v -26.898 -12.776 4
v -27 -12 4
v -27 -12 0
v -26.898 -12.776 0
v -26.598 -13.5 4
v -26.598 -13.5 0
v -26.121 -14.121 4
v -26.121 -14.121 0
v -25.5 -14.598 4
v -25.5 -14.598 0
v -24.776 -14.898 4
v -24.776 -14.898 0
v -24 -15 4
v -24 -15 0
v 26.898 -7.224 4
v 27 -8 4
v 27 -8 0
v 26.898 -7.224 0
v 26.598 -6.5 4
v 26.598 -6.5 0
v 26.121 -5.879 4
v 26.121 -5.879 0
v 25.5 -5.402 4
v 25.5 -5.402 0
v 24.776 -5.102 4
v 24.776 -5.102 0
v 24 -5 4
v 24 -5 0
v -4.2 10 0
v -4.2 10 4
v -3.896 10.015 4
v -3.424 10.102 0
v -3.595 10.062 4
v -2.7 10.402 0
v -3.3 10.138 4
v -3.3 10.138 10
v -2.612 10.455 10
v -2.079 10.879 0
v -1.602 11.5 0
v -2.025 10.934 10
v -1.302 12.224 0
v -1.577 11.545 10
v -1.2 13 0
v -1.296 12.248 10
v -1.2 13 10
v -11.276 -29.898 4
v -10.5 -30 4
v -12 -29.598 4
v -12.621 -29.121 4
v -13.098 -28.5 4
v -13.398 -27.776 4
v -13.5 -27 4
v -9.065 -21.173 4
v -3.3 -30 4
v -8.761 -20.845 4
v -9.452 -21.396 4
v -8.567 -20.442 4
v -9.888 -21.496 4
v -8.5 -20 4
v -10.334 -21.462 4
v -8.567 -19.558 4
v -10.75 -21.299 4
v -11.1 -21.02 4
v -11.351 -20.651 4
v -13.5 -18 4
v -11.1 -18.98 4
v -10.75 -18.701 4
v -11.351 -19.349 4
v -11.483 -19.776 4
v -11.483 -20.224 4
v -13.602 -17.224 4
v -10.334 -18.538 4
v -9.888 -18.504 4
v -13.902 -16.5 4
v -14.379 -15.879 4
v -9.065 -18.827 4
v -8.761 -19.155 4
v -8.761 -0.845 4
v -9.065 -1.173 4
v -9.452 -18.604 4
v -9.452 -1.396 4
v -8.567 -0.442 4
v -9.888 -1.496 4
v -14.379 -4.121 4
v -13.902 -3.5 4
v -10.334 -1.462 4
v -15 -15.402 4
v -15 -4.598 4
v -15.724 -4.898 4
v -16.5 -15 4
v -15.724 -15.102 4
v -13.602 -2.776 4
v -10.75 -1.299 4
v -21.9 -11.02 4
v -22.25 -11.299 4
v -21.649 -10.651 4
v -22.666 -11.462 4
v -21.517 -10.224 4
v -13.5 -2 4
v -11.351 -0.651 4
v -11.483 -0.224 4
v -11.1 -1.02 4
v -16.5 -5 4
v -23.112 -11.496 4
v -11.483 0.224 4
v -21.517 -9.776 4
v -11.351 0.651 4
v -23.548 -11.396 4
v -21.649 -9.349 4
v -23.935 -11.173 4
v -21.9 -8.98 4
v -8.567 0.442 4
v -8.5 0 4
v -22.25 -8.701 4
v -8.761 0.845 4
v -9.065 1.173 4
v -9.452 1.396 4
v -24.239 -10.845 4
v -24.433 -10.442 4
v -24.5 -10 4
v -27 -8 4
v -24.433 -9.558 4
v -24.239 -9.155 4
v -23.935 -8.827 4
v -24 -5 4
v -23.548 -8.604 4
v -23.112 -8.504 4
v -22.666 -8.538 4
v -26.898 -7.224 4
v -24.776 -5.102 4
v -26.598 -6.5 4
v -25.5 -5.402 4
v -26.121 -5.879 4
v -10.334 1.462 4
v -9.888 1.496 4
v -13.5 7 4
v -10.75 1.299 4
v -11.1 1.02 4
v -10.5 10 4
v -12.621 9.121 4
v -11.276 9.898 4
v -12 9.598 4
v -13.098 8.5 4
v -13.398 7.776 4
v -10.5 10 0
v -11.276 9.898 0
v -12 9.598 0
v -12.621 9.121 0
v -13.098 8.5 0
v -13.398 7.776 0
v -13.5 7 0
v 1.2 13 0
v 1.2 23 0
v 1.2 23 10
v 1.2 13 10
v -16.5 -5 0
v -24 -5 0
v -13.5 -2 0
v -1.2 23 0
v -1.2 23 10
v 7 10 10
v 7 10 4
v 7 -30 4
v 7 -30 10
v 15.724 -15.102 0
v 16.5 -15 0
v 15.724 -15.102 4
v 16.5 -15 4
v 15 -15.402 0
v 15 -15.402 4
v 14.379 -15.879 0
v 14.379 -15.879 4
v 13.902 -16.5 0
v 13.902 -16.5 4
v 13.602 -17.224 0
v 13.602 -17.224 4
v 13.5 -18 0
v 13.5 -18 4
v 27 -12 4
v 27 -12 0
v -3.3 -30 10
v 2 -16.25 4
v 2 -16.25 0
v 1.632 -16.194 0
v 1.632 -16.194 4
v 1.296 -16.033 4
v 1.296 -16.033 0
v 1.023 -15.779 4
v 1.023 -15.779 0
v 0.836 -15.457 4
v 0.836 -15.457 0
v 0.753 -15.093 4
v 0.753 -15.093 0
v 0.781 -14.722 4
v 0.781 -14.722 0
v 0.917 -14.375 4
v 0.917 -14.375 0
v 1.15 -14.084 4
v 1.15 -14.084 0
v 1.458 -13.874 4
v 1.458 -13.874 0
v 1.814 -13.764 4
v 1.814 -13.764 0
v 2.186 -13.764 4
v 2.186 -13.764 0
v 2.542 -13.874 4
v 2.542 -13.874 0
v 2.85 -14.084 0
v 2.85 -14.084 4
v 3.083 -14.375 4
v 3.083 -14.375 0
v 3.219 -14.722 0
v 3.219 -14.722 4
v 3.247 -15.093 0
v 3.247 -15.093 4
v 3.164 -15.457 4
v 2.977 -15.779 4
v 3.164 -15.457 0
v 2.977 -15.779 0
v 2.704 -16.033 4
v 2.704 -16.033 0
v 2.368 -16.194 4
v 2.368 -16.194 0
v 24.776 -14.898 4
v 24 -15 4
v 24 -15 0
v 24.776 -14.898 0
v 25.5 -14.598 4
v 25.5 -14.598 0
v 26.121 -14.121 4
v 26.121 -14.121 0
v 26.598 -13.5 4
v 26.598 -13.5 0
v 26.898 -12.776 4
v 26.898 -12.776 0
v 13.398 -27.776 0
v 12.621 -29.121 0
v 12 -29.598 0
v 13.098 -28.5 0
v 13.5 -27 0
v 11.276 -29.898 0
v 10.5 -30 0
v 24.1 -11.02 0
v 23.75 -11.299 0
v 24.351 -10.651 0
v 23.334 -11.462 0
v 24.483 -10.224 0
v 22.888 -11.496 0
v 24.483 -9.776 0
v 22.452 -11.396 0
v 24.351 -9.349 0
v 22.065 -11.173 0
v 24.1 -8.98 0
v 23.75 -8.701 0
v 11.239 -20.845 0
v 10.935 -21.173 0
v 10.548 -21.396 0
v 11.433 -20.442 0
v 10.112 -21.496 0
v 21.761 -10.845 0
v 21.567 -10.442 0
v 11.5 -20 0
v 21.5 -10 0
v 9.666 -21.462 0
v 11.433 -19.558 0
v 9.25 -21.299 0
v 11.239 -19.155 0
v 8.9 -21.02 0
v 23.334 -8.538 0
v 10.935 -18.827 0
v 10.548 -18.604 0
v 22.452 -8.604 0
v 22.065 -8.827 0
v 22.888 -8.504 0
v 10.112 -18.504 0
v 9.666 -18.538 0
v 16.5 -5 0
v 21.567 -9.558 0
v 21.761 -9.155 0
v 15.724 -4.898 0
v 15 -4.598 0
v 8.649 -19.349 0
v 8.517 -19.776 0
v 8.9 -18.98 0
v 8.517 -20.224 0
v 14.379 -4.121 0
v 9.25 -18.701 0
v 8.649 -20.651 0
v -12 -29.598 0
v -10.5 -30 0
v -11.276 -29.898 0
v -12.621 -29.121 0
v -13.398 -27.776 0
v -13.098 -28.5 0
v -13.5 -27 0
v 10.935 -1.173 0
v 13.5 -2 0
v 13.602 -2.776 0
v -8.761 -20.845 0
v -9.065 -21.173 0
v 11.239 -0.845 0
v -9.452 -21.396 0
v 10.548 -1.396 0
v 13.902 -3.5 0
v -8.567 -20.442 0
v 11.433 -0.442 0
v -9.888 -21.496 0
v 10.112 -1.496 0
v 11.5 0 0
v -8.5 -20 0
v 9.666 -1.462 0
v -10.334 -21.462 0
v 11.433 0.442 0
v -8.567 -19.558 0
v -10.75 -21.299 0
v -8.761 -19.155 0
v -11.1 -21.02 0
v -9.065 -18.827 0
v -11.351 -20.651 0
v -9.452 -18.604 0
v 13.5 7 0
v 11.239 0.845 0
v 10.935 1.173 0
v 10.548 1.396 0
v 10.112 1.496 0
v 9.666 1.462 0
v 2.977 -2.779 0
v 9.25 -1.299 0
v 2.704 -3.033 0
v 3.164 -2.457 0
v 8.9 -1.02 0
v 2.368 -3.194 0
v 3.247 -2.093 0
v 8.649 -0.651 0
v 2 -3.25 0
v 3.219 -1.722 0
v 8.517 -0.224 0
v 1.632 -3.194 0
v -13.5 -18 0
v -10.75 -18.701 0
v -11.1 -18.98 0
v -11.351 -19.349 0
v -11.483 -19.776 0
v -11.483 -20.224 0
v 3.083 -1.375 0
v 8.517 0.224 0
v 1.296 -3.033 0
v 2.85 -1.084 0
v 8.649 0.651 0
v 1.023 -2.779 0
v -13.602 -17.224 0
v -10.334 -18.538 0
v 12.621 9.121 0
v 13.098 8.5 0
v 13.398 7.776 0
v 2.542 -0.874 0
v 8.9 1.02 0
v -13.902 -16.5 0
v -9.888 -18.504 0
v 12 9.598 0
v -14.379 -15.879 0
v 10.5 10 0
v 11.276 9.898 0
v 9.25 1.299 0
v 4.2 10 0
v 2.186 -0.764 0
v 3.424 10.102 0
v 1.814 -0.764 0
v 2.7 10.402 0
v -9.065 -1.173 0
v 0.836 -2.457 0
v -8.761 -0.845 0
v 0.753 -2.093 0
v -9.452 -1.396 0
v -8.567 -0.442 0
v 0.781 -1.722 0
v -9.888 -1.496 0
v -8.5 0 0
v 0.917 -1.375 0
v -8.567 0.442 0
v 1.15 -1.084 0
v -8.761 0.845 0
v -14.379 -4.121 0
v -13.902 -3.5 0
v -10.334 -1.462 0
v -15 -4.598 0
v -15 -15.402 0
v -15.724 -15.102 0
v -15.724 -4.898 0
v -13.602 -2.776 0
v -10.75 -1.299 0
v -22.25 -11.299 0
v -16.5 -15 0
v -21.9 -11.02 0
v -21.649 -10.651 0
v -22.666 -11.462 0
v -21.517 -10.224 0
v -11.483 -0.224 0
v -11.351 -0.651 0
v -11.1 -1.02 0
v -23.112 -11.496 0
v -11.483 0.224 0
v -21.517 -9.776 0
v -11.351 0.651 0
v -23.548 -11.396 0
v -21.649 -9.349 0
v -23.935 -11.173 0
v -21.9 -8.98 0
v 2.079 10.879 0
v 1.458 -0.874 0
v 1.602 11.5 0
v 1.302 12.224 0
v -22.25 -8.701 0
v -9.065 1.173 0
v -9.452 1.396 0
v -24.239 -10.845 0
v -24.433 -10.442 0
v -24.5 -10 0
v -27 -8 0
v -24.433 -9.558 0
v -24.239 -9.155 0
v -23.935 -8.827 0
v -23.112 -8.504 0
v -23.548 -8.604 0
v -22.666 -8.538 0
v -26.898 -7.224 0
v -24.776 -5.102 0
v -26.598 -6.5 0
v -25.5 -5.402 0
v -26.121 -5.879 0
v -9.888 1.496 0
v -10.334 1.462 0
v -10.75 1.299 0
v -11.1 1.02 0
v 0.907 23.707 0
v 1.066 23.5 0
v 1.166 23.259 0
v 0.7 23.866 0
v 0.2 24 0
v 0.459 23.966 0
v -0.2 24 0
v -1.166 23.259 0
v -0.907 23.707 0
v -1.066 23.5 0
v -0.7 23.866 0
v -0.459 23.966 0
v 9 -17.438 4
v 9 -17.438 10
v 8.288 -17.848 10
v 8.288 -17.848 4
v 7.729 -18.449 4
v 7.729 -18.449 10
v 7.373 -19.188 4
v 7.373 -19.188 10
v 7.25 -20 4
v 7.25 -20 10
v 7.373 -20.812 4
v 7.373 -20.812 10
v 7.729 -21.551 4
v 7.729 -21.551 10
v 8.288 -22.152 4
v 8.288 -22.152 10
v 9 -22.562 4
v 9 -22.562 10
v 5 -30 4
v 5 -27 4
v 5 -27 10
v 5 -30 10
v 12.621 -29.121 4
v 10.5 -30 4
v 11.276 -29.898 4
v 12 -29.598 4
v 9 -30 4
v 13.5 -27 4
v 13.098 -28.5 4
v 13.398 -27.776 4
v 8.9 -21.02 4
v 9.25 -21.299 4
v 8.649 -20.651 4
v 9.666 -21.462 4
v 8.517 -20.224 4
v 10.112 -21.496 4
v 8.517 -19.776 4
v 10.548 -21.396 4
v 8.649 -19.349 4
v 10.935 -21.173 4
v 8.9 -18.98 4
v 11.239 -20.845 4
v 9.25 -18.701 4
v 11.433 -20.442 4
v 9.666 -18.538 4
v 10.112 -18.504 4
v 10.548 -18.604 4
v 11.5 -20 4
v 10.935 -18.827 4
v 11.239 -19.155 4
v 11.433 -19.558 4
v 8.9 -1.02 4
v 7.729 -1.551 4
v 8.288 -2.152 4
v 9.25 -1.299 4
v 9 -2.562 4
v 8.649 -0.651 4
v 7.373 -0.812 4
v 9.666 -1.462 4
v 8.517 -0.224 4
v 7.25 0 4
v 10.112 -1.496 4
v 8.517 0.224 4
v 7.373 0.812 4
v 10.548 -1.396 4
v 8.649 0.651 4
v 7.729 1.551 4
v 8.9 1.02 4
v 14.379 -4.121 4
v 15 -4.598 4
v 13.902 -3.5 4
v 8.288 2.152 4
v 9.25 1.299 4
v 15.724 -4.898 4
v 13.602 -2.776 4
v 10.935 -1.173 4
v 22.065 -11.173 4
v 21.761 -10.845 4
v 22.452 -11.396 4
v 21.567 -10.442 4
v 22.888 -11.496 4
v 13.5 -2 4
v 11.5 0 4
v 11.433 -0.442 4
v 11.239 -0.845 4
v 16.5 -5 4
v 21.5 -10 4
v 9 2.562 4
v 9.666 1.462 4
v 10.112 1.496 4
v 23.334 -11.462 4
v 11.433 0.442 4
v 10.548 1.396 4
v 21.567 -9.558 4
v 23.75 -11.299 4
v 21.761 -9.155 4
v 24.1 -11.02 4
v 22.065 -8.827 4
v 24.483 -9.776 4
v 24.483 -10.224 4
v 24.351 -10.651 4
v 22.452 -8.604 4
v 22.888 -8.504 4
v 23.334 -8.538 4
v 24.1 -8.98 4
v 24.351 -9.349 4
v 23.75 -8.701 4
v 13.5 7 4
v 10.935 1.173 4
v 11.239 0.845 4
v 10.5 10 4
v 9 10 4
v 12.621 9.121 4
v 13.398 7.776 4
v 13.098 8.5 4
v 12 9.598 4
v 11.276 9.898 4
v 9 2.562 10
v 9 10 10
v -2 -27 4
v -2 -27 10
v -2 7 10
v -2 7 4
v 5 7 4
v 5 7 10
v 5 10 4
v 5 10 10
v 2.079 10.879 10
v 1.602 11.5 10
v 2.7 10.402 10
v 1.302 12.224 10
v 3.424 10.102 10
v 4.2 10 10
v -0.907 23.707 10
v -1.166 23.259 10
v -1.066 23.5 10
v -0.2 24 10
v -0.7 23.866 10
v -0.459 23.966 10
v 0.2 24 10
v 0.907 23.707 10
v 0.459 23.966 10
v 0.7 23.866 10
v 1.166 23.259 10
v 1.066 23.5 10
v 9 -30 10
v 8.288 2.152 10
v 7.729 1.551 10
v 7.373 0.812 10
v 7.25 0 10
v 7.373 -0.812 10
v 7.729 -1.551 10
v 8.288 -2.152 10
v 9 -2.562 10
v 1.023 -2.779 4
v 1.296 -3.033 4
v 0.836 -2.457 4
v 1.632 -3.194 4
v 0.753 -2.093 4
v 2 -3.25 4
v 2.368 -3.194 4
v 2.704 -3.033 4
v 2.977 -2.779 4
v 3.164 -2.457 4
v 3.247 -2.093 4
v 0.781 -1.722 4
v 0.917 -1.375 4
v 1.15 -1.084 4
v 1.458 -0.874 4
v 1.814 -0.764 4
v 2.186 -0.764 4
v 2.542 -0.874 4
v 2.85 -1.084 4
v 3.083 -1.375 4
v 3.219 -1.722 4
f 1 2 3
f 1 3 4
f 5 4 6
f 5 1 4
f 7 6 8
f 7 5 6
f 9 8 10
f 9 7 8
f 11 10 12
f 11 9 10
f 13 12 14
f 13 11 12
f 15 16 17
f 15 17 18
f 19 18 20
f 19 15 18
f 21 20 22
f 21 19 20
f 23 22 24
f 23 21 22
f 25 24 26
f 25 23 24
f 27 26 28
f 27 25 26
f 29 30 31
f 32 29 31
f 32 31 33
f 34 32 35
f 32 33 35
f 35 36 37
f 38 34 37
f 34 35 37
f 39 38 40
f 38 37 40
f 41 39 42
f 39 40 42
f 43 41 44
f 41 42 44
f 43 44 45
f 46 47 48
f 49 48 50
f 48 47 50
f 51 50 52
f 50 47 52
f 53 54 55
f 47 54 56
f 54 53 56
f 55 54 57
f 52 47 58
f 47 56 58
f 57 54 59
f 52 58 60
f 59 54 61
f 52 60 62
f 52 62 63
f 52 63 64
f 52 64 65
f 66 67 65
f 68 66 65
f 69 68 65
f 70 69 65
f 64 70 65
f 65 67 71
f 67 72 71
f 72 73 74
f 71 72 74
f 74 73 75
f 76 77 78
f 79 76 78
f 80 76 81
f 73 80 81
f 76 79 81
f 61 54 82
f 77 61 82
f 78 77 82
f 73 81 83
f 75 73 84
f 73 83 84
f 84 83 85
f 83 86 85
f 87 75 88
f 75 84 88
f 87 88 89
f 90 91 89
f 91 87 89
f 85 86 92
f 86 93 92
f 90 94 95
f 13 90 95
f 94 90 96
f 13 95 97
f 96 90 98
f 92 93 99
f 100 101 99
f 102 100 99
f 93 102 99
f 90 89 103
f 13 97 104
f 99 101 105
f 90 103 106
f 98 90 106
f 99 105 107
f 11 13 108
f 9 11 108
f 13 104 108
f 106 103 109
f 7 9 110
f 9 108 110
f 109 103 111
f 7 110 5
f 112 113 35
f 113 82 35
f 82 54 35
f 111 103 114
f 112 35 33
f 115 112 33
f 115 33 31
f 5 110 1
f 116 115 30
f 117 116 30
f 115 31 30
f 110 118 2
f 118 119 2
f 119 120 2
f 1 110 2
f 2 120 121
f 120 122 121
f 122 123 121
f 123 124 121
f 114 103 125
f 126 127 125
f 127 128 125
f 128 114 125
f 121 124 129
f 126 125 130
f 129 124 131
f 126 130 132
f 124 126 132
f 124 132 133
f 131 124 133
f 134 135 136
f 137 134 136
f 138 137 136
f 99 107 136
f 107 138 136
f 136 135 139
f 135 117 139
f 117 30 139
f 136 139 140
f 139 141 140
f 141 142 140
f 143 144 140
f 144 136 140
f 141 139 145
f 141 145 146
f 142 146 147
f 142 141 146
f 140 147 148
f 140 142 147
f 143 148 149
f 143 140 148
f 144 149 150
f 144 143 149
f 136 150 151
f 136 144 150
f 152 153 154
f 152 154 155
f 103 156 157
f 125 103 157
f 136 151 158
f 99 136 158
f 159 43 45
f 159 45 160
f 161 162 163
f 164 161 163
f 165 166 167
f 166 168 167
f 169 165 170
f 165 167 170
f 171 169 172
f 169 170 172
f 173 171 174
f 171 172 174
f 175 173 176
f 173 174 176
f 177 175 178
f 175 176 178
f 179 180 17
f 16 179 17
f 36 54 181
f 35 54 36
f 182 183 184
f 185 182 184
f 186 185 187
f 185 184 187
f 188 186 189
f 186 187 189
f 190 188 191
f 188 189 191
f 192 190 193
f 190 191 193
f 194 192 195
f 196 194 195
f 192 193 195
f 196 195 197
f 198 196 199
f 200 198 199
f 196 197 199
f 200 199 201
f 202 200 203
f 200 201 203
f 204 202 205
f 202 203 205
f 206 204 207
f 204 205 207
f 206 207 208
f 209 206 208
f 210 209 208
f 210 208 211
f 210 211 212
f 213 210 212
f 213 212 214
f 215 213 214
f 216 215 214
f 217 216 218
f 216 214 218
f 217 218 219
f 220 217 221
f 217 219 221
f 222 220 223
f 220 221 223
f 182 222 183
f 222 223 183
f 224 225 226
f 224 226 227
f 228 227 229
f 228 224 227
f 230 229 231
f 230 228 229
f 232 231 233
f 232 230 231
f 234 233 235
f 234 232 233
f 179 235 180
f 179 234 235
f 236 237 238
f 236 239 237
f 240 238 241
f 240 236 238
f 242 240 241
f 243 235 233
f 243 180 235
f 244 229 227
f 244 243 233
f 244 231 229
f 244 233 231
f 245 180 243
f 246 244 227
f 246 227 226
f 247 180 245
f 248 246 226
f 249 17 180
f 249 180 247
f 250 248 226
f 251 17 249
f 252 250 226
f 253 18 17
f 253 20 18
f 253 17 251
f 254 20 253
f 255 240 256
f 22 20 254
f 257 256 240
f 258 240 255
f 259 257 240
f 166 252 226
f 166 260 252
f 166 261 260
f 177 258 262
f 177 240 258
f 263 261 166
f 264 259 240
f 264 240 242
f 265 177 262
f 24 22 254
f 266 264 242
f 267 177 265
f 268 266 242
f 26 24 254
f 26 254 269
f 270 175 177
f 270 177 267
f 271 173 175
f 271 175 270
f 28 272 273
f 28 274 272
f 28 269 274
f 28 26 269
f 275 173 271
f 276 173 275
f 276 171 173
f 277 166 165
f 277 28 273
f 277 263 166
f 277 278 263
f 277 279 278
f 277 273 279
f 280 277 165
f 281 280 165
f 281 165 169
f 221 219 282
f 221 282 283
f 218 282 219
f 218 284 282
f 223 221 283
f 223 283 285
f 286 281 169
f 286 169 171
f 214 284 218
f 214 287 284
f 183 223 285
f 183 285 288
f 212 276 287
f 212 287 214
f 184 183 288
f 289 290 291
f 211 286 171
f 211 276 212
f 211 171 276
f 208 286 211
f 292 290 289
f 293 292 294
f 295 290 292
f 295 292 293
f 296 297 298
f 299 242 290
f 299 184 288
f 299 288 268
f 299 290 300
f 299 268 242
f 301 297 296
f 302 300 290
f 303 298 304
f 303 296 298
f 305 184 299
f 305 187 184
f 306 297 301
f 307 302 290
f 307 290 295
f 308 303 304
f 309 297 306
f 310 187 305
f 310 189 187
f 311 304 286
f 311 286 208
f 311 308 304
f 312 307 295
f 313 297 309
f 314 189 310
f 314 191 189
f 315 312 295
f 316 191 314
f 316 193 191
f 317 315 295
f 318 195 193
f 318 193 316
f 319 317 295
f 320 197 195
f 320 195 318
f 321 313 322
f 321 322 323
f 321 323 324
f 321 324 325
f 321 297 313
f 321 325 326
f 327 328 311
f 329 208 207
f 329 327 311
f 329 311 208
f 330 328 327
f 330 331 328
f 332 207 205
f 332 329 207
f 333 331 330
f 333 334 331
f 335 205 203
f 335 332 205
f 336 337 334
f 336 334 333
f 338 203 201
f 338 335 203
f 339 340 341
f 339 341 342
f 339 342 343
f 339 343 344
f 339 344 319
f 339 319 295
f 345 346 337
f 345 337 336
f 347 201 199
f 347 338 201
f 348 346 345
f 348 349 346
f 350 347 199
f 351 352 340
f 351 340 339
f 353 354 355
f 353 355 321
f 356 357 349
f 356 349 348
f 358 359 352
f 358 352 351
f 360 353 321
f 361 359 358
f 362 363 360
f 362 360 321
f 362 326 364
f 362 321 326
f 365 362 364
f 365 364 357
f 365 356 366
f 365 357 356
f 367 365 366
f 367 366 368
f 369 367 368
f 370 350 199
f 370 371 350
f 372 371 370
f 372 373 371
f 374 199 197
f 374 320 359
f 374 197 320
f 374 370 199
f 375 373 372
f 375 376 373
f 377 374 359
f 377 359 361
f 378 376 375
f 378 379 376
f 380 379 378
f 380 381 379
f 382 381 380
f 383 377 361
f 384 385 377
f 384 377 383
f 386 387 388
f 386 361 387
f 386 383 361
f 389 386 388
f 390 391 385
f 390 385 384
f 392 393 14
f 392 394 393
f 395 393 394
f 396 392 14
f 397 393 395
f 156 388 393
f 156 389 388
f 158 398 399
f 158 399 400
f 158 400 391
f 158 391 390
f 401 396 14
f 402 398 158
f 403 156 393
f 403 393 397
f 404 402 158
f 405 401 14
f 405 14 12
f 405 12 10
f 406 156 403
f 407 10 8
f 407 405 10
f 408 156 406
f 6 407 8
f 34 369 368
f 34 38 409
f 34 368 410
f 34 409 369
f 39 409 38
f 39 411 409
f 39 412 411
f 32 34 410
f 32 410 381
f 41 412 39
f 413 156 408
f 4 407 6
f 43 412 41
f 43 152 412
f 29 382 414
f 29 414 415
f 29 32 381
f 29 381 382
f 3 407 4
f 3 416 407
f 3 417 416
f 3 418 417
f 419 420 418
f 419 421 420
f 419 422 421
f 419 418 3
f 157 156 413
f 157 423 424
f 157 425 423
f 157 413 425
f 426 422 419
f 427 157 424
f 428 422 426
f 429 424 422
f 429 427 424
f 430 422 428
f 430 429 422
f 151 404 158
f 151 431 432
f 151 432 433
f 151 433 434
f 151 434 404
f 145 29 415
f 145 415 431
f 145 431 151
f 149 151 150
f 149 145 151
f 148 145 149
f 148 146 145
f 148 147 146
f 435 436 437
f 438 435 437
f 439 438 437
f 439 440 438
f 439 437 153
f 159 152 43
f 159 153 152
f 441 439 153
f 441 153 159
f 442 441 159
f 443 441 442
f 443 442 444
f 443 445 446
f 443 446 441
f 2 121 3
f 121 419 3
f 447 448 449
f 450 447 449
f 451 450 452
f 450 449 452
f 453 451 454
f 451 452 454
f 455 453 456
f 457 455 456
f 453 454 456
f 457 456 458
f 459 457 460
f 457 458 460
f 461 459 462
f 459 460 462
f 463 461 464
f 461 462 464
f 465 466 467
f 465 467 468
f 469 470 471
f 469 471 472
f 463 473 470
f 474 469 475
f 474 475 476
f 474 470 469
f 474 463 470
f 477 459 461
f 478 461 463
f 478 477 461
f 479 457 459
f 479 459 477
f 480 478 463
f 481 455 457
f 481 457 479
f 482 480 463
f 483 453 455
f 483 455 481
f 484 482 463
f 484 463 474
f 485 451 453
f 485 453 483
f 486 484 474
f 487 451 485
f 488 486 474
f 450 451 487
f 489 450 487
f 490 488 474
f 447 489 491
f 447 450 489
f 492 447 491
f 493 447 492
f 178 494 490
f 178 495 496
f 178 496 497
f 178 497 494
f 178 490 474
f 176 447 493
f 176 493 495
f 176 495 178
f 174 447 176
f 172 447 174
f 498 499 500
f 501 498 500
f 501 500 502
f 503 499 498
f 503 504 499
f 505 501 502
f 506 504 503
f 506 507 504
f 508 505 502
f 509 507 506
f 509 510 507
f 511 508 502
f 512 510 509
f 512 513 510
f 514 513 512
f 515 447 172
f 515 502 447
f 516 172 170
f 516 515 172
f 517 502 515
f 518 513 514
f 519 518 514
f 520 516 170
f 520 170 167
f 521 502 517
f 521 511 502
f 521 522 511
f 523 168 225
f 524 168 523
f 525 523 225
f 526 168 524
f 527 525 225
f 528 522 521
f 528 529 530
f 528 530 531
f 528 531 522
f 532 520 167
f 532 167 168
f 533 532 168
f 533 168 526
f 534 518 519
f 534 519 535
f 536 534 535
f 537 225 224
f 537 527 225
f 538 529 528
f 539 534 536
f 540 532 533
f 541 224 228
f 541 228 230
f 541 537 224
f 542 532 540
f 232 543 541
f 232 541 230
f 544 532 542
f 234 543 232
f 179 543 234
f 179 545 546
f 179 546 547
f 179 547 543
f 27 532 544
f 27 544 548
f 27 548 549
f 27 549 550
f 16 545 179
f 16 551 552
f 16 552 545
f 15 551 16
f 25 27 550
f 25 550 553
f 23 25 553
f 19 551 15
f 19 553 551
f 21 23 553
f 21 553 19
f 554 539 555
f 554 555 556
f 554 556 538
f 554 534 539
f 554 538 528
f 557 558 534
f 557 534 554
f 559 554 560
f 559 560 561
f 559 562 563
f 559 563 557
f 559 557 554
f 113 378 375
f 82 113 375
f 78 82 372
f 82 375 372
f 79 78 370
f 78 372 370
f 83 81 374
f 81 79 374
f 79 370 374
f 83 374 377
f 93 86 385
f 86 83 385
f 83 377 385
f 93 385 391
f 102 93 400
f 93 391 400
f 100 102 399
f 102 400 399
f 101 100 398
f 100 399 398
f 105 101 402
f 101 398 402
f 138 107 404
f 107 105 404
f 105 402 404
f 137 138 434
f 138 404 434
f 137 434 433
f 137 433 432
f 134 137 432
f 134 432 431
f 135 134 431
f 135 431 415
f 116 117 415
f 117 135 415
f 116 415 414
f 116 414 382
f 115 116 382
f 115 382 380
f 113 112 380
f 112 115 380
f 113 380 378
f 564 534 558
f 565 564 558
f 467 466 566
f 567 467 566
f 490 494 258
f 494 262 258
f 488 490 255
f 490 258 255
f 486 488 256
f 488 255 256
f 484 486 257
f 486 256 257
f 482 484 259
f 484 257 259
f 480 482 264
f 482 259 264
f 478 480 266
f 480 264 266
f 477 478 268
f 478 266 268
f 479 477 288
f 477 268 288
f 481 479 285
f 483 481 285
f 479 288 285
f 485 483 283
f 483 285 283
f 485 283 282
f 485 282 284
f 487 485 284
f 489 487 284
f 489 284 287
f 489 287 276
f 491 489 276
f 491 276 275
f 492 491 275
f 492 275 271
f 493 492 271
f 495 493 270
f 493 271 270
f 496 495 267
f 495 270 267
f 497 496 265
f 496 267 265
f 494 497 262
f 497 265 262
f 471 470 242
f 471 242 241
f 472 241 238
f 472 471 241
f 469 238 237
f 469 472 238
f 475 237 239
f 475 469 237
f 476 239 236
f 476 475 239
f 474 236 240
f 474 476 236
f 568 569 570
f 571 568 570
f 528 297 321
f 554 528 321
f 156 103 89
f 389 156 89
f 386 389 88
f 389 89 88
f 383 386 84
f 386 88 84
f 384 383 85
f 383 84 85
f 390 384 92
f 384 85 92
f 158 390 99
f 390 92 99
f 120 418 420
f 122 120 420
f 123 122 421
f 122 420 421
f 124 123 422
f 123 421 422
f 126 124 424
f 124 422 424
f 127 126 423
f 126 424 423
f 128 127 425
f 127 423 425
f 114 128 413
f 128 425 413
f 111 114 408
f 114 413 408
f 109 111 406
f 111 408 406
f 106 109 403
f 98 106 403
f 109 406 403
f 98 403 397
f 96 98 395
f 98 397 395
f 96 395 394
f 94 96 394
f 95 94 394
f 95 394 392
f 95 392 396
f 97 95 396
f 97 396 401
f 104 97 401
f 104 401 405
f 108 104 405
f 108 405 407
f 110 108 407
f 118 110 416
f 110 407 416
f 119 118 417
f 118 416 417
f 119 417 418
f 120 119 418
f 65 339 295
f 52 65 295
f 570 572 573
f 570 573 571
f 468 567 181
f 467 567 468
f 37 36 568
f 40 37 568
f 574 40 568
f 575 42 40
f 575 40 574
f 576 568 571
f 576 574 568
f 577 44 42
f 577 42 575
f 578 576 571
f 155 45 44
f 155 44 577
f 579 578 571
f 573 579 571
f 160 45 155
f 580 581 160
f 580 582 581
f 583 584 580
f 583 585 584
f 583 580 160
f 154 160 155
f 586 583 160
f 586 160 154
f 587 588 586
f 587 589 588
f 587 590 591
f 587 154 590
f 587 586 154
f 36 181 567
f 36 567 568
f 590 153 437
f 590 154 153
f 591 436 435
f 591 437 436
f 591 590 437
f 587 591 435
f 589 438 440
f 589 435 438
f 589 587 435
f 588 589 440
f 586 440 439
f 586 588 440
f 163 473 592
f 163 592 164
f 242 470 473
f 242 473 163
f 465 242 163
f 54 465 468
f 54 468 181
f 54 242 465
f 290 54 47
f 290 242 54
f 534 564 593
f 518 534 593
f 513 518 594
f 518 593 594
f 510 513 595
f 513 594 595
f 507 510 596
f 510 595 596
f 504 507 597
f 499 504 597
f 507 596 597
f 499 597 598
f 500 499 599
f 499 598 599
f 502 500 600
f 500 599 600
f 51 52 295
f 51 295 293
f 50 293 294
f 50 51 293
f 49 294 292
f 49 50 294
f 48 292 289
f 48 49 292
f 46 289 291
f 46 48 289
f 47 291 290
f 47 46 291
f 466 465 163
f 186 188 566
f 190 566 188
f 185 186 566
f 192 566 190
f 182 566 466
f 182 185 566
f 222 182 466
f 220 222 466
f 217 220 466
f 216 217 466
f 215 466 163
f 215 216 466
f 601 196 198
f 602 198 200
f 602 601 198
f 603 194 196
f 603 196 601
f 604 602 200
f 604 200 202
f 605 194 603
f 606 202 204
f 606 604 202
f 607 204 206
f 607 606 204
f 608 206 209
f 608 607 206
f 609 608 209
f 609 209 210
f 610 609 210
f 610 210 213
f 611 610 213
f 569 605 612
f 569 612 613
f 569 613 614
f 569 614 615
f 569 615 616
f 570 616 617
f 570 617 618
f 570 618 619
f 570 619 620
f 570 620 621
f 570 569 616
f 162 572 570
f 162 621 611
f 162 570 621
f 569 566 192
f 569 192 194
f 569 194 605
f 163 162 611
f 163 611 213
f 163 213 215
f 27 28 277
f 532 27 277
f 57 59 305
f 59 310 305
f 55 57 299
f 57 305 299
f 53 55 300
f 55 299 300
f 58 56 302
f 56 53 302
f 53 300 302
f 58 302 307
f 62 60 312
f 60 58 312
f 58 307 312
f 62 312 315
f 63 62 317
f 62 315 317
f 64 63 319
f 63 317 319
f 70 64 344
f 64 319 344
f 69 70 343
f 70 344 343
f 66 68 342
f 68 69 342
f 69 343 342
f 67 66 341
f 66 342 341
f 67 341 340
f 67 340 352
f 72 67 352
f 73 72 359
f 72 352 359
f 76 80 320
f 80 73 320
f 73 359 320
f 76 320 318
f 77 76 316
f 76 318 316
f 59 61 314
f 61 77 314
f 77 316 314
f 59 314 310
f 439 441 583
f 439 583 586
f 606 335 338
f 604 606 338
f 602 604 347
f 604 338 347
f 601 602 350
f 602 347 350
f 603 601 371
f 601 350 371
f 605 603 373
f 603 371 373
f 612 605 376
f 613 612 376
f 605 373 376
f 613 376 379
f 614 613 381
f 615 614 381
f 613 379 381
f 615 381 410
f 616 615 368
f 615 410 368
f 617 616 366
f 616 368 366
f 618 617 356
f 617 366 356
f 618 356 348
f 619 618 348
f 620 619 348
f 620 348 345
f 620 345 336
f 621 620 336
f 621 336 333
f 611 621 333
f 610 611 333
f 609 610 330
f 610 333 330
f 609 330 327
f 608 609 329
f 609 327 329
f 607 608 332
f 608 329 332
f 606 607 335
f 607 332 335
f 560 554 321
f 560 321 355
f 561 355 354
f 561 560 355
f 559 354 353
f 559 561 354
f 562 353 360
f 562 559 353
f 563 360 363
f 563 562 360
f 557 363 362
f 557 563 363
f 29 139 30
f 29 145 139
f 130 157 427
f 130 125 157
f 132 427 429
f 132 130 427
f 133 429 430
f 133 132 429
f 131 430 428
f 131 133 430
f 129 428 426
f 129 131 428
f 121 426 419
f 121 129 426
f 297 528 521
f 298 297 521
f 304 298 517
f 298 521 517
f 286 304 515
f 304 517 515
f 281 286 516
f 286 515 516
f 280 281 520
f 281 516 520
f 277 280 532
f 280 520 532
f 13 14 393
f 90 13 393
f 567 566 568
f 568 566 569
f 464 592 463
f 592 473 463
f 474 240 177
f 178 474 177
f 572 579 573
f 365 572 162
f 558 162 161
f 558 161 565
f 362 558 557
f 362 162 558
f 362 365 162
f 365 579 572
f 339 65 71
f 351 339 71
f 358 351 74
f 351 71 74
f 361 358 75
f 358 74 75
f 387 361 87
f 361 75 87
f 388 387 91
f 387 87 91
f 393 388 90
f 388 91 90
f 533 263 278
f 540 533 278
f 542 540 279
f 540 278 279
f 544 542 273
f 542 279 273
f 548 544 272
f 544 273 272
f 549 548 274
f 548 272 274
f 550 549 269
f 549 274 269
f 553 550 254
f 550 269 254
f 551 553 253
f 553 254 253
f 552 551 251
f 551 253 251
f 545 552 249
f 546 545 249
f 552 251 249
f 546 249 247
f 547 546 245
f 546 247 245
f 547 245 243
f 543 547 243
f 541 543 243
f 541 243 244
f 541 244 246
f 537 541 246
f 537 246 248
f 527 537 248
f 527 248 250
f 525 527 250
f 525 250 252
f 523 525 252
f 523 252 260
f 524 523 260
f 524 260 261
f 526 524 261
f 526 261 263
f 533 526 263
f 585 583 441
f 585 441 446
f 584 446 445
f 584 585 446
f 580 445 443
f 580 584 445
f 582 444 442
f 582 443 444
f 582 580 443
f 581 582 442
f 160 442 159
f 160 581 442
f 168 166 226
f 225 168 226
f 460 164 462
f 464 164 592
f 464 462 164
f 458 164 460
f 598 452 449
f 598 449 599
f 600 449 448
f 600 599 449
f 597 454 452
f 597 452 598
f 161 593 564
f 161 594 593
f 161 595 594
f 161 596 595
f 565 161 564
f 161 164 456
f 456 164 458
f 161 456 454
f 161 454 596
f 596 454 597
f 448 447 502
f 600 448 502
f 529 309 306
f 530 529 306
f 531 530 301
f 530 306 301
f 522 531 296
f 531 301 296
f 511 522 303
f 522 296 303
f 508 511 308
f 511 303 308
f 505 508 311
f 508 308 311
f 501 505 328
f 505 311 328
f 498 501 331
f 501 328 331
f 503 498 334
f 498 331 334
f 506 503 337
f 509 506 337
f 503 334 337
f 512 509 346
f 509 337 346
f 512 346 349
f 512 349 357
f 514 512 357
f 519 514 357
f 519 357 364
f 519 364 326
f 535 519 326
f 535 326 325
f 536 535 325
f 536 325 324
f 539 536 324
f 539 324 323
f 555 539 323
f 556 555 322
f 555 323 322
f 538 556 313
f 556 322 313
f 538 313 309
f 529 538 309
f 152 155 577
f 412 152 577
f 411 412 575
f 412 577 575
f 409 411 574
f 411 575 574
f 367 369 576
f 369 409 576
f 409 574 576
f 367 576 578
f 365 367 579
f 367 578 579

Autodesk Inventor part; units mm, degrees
ref_plane "YZ Plane" through (0, 0, 0) normal (1, 0, 0) x (0, 1, 0)
ref_plane "XZ Plane" through (0, 0, 0) normal (0, 1, 0) x (-1, 0, 0)
ref_plane "XY Plane" through (0, 0, 0) normal (0, 0, 1) x (1, 0, 0)
sketch "Sketch1" plane through (0, 0, 0) normal (0, 0, 1) x (1, 0, 0)
  circle A0 centre (-10, 0) radius 1.5
  circle A1 centre (10, 0) radius 1.5
  circle A2 centre (-10, -20) radius 1.5
  circle A3 centre (10, -20) radius 1.5
  line L0 (-15, 10) -> (15, 10)
  line L1 (15, 10) -> (15, -30)
  line L2 (15, -30) -> (-15, -30)
  line L3 (-15, -30) -> (-15, 10)
  point P0 (0, 0)
  dimension "d0" = 3
  dimension "d1" = 3
  dimension "d2" = 20
  dimension "d3" = 10
  dimension "d4" = 3
  dimension "d5" = 3
  dimension "d6" = 20
  dimension "d7" = 20
  dimension "d8" = 20
  dimension "d9" = 10
  dimension "d10" = 30
  dimension "d11" = 15
  dimension "d12" = 40
  dimension "d13" = 10
extrude "Extrusion1" add sketch "Sketch1" along normal blind 4
sketch "Sketch2" plane through (0, 0, 4) normal (0, 0, 1) x (1, 0, 0)
  line L0 (0, 15.4421) -> (0, -37.5419) construction
  line L1 (-4, 15.4421) -> (-4, -37.5419) construction
  line L2 (-15, -30) -> (15, -30) construction
  line L3 (15, 10) -> (-15, 10) projected
  line L4 (9, -30) -> (9, 10)
  line L5 (7, 10) -> (7, -30)
  line L6 (7, 10) -> (9, 10)
  line L7 (7, -30) -> (9, -30)
  line L8 (6.3, 15.4421) -> (6.3, 10) construction
  line L9 (6.3, -30) -> (6.3, -37.5419) construction
  line L10 (-15, 10) -> (-15, -30) projected
  point P0 (0, 0)
  dimension "d16" = 4
  dimension "d96" = 0
  dimension "d97" = 0
  dimension "d141" = 22
extrude "Extrusion2" add sketch "Sketch2" along normal blind 6
sketch "Sketch4" plane through (0, 0, 10) normal (0, 0, 1) x (1, 0, 0)
  circle A0 centre (10, 0) radius 2.75
  circle A1 centre (10, -20) radius 1.5 projected
  circle A2 centre (10, -20) radius 2.75
  point P0 (0, 0)
  point P1 (8.5, 0)
  point P2 (8.5, -20)
  dimension "d37" = 5.5
  dimension "d38" = 5.5
extrude "Extrusion3" cut sketch "Sketch4" against normal up to surface (6 mm away) contours A0 | A1 | A2
sketch "Sketch5" plane through (0, 0, 4) normal (0, 0, 1) x (1, 0, 0)
  line L0 (-4, 15.4421) -> (-4, -37.5419) construction
  line L1 (15, -30) -> (-15, -30) projected
  line L2 (15, 10) -> (-15, 10) projected
  line L3 (-3.3, 10) -> (5, 10)
  line L4 (5, -30) -> (-3.3, -30)
  line L5 (-3.3, -30) -> (-3.3, 10)
  line L6 (-2, 7) -> (5, 7)
  line L7 (5, -27) -> (-2, -27)
  line L8 (-2, -27) -> (-2, 7)
  line L9 (5, 10) -> (5, 7)
  line L10 (5, -27) -> (5, -30)
  line L11 (7, 10) -> (7, -30) projected
  point P0 (0, 0)
  point P1 (6.3, 10)
  point P2 (6.3, -30)
  dimension "d111" = 0.7
  dimension "d112" = 3
  dimension "d115" = 3
  dimension "d116" = 1.3
  dimension "d117" = 2
  dimension "d118" = 2
  dimension "d139" = 0
  dimension "d140" = 0
extrude "Extrusion4" add sketch "Sketch5" along normal up to surface (6 mm away) contours L1 L5 L2 L9 L6 L8 L7 L10
sketch "Sketch8" plane through (0, 0, 0) normal (0, 0, -1) x (-1, 0, 0)
  line L0 (27, -15) -> (-27, -15)
  line L1 (-27, -15) -> (-27, -5)
  line L2 (-27, -5) -> (27, -5)
  line L3 (27, -5) -> (27, -15)
  line L4 (15, 10) -> (-15, 10) projected
  line L5 (-15, -30) -> (15, -30) projected
  circle A0 centre (23, -10) radius 1.5
  circle A1 centre (-23, -10) radius 1.5
  point P0 (0, 0)
  dimension "d77" = 10
  dimension "d78" = 40
  dimension "d79" = 15
  dimension "d80" = 3
  dimension "d81" = 3
  dimension "d82" = 46
  dimension "d83" = 54
  dimension "d84" = 23
  dimension "d85" = 27
extrude "Extrusion5" add sketch "Sketch8" against normal up to surface (4 mm away)
sketch "Sketch3" plane through (0, 0, 4) normal (0, 0, 1) x (1, 0, 0)
  circle A0 centre (2, -2) radius 1.25
  circle A1 centre (2, -15) radius 1.25
  line L0 (-15, -30) -> (15, -30) projected
  line L1 (15, 10) -> (-15, 10) projected
  point P0 (0, 0)
  point P1 (7, -30)
  point P2 (6.3, 10)
  dimension "d23" = 2.5
  dimension "d24" = 2.5
  dimension "d25" = 15
  dimension "d26" = 2
  dimension "d27" = 2
  dimension "d28" = 12
hole "Hole1" at (2, -2, 4) at (2, -15, 4) direction (0, 0, -1) diameter 2.5 end through all
fillet "Fillet5" [suppressed]
fillet "Fillet7" [suppressed]
sketch "Sketch11" plane through (0, 0, 0) normal (0, 0, -1) x (-1, 0, 0)
  line L0 (15, -15) -> (13.5, -15)
  line L1 (13.5, -5) -> (15, -5)
  line L2 (-15, -5) -> (-13.5, -5)
  line L3 (-13.5, -15) -> (-15, -15)
  line L4 (15, -30) -> (15, -15)
  line L5 (-15, -15) -> (-15, -30)
  line L6 (-15, 10) -> (-15, -5)
  line L7 (15, -5) -> (15, 10)
  line L8 (-15, -30) -> (-13.5, -30)
  line L9 (13.5, -30) -> (15, -30)
  line L10 (-13.5, -30) -> (-13.5, -15)
  line L11 (-13.5, -5) -> (-13.5, 10)
  line L12 (13.5, 10) -> (13.5, -5)
  line L13 (13.5, -15) -> (13.5, -30)
  line L14 (15, 10) -> (13.5, 10)
  line L15 (-15, 10) -> (15, 10) projected
  line L16 (-15, 10) -> (-13.5, 10)
  point P0 (0, 0)
  dimension "d121" = 27
extrude "Extrusion7" cut sketch "Sketch11" against normal through all
fillet "Fillet9" radius 3 12 edges at (-27, -15, 2) (-13.5, -30, 2) (13.5, -30, 2) (-27, -5, 2) (-13.5, -5, 2) (-13.5, 10, 2) (13.5, -15, 2) (27, -15, 2) (27, -5, 2) (13.5, -5, 2) (13.5, 10, 2) (-13.5, -15, 2)
sketch "Sketch12" plane through (4, -30, 4) normal (0, -1, 0) x (1, 0, 0)
  line L0 (1, 6) -> (-7.3, 6) projected
  circle A0 centre (-2, 3) radius 1.5
  line L1 (5, 0) -> (6.5, 0) projected
  line L2 (6.5, -4) -> (-14.5, -4) projected
  line L3 (6.5, 0) -> (6.5, -4) projected
  line L4 (-14.5, -4) -> (-14.5, 0) projected
  line L5 (-7.3, 0) -> (-7.3, 6) projected
  line L6 (-14.5, 0) -> (-7.3, 0) projected
  line L7 (5, 0) -> (5, 6) projected
  line L8 (3, 6) -> (5, 6) projected
  line L9 (3, 0) -> (3, 6) projected
  line L10 (1, 0) -> (3, 0) projected
  line L11 (1, 0) -> (1, 6) projected
  point P0 (-4, -4)
  dimension "d126" = 3
  dimension "d129" = 3
extrude "Extrusion8" [suppressed]
sketch "Sketch14" plane through (0, 0, 0) normal (0, 0, -1) x (-1, 0, 0)
  line L0 (10.5, 10) -> (-10.5, 10) projected
  line L1 (-1.2, 10) -> (1.2, 10)
  line L2 (1.2, 10) -> (1.2, 24)
  line L3 (1.2, 24) -> (-1.2, 24)
  line L4 (-1.2, 24) -> (-1.2, 10)
  point P0 (0, 0)
  dimension "d142" = 14
  dimension "d143" = 1.2
  dimension "d144" = 1.2
extrude "Extrusion10" add sketch "Sketch14" against normal blind 10
fillet "Fillet10" radius 3 2 edges at (-1.2, 10, 5) (1.2, 10, 5)
fillet "Fillet11" radius 1 2 edges at (-1.2, 24, 5) (1.2, 24, 5)
sketch "Sketch13" plane through (-10.5, -30, 0) normal (0, -1, 0) x (1, 0, 0)
  line L0 (21, 4) -> (21, 0) projected
  line L1 (0, 4) -> (21, 4) projected
  line L2 (0, 0) -> (0, 4) projected
  line L3 (21, 0) -> (0, 0) projected
  circle A0 centre (10.5, 2) radius 1.5
  point P0 (10.5, 0)
  dimension "d132" = 3
  dimension "d133" = 21
  dimension "d134" = 4
  dimension "d135" = 2
  dimension "d136" = 10.5
sketch "Sketch9" plane through (0, 0, 4) normal (0, 0, 1) x (1, 0, 0)
  circle A0 centre (-10, 0) radius 1.5 projected
  circle A1 centre (2, -2) radius 1.25 projected
  circle A2 centre (10, 0) radius 1.5 projected
  circle A3 centre (23, -10) radius 1.5 projected
  circle A4 centre (10, -20) radius 1.5 projected
  circle A5 centre (2, -15) radius 1.25 projected
  circle A6 centre (-10, -20) radius 1.5 projected
  circle A7 centre (-23, -10) radius 1.5 projected
  point P0 (0, 0)
equation "\"d3\" = 0.5 * d2"
equation "\"d7\" = d6"
equation "\"d8\" = d2"
equation "\"d9\" = d3"
equation "\"d11\" = 0.5 * d10"
equation "\"d13\" = -0.5 * d6 + 0.5 * d12"
equation "\"d37\" = d38"
equation "\"d115\" = d112"
equation "\"d79\" = -0.5 * d77 + 0.5 * d78"
equation "\"d84\" = 0.5 * d82"
equation "\"d85\" = 0.5 * d83"
equation "\"d27\" = d26"
properties part number "vertical carriage"
